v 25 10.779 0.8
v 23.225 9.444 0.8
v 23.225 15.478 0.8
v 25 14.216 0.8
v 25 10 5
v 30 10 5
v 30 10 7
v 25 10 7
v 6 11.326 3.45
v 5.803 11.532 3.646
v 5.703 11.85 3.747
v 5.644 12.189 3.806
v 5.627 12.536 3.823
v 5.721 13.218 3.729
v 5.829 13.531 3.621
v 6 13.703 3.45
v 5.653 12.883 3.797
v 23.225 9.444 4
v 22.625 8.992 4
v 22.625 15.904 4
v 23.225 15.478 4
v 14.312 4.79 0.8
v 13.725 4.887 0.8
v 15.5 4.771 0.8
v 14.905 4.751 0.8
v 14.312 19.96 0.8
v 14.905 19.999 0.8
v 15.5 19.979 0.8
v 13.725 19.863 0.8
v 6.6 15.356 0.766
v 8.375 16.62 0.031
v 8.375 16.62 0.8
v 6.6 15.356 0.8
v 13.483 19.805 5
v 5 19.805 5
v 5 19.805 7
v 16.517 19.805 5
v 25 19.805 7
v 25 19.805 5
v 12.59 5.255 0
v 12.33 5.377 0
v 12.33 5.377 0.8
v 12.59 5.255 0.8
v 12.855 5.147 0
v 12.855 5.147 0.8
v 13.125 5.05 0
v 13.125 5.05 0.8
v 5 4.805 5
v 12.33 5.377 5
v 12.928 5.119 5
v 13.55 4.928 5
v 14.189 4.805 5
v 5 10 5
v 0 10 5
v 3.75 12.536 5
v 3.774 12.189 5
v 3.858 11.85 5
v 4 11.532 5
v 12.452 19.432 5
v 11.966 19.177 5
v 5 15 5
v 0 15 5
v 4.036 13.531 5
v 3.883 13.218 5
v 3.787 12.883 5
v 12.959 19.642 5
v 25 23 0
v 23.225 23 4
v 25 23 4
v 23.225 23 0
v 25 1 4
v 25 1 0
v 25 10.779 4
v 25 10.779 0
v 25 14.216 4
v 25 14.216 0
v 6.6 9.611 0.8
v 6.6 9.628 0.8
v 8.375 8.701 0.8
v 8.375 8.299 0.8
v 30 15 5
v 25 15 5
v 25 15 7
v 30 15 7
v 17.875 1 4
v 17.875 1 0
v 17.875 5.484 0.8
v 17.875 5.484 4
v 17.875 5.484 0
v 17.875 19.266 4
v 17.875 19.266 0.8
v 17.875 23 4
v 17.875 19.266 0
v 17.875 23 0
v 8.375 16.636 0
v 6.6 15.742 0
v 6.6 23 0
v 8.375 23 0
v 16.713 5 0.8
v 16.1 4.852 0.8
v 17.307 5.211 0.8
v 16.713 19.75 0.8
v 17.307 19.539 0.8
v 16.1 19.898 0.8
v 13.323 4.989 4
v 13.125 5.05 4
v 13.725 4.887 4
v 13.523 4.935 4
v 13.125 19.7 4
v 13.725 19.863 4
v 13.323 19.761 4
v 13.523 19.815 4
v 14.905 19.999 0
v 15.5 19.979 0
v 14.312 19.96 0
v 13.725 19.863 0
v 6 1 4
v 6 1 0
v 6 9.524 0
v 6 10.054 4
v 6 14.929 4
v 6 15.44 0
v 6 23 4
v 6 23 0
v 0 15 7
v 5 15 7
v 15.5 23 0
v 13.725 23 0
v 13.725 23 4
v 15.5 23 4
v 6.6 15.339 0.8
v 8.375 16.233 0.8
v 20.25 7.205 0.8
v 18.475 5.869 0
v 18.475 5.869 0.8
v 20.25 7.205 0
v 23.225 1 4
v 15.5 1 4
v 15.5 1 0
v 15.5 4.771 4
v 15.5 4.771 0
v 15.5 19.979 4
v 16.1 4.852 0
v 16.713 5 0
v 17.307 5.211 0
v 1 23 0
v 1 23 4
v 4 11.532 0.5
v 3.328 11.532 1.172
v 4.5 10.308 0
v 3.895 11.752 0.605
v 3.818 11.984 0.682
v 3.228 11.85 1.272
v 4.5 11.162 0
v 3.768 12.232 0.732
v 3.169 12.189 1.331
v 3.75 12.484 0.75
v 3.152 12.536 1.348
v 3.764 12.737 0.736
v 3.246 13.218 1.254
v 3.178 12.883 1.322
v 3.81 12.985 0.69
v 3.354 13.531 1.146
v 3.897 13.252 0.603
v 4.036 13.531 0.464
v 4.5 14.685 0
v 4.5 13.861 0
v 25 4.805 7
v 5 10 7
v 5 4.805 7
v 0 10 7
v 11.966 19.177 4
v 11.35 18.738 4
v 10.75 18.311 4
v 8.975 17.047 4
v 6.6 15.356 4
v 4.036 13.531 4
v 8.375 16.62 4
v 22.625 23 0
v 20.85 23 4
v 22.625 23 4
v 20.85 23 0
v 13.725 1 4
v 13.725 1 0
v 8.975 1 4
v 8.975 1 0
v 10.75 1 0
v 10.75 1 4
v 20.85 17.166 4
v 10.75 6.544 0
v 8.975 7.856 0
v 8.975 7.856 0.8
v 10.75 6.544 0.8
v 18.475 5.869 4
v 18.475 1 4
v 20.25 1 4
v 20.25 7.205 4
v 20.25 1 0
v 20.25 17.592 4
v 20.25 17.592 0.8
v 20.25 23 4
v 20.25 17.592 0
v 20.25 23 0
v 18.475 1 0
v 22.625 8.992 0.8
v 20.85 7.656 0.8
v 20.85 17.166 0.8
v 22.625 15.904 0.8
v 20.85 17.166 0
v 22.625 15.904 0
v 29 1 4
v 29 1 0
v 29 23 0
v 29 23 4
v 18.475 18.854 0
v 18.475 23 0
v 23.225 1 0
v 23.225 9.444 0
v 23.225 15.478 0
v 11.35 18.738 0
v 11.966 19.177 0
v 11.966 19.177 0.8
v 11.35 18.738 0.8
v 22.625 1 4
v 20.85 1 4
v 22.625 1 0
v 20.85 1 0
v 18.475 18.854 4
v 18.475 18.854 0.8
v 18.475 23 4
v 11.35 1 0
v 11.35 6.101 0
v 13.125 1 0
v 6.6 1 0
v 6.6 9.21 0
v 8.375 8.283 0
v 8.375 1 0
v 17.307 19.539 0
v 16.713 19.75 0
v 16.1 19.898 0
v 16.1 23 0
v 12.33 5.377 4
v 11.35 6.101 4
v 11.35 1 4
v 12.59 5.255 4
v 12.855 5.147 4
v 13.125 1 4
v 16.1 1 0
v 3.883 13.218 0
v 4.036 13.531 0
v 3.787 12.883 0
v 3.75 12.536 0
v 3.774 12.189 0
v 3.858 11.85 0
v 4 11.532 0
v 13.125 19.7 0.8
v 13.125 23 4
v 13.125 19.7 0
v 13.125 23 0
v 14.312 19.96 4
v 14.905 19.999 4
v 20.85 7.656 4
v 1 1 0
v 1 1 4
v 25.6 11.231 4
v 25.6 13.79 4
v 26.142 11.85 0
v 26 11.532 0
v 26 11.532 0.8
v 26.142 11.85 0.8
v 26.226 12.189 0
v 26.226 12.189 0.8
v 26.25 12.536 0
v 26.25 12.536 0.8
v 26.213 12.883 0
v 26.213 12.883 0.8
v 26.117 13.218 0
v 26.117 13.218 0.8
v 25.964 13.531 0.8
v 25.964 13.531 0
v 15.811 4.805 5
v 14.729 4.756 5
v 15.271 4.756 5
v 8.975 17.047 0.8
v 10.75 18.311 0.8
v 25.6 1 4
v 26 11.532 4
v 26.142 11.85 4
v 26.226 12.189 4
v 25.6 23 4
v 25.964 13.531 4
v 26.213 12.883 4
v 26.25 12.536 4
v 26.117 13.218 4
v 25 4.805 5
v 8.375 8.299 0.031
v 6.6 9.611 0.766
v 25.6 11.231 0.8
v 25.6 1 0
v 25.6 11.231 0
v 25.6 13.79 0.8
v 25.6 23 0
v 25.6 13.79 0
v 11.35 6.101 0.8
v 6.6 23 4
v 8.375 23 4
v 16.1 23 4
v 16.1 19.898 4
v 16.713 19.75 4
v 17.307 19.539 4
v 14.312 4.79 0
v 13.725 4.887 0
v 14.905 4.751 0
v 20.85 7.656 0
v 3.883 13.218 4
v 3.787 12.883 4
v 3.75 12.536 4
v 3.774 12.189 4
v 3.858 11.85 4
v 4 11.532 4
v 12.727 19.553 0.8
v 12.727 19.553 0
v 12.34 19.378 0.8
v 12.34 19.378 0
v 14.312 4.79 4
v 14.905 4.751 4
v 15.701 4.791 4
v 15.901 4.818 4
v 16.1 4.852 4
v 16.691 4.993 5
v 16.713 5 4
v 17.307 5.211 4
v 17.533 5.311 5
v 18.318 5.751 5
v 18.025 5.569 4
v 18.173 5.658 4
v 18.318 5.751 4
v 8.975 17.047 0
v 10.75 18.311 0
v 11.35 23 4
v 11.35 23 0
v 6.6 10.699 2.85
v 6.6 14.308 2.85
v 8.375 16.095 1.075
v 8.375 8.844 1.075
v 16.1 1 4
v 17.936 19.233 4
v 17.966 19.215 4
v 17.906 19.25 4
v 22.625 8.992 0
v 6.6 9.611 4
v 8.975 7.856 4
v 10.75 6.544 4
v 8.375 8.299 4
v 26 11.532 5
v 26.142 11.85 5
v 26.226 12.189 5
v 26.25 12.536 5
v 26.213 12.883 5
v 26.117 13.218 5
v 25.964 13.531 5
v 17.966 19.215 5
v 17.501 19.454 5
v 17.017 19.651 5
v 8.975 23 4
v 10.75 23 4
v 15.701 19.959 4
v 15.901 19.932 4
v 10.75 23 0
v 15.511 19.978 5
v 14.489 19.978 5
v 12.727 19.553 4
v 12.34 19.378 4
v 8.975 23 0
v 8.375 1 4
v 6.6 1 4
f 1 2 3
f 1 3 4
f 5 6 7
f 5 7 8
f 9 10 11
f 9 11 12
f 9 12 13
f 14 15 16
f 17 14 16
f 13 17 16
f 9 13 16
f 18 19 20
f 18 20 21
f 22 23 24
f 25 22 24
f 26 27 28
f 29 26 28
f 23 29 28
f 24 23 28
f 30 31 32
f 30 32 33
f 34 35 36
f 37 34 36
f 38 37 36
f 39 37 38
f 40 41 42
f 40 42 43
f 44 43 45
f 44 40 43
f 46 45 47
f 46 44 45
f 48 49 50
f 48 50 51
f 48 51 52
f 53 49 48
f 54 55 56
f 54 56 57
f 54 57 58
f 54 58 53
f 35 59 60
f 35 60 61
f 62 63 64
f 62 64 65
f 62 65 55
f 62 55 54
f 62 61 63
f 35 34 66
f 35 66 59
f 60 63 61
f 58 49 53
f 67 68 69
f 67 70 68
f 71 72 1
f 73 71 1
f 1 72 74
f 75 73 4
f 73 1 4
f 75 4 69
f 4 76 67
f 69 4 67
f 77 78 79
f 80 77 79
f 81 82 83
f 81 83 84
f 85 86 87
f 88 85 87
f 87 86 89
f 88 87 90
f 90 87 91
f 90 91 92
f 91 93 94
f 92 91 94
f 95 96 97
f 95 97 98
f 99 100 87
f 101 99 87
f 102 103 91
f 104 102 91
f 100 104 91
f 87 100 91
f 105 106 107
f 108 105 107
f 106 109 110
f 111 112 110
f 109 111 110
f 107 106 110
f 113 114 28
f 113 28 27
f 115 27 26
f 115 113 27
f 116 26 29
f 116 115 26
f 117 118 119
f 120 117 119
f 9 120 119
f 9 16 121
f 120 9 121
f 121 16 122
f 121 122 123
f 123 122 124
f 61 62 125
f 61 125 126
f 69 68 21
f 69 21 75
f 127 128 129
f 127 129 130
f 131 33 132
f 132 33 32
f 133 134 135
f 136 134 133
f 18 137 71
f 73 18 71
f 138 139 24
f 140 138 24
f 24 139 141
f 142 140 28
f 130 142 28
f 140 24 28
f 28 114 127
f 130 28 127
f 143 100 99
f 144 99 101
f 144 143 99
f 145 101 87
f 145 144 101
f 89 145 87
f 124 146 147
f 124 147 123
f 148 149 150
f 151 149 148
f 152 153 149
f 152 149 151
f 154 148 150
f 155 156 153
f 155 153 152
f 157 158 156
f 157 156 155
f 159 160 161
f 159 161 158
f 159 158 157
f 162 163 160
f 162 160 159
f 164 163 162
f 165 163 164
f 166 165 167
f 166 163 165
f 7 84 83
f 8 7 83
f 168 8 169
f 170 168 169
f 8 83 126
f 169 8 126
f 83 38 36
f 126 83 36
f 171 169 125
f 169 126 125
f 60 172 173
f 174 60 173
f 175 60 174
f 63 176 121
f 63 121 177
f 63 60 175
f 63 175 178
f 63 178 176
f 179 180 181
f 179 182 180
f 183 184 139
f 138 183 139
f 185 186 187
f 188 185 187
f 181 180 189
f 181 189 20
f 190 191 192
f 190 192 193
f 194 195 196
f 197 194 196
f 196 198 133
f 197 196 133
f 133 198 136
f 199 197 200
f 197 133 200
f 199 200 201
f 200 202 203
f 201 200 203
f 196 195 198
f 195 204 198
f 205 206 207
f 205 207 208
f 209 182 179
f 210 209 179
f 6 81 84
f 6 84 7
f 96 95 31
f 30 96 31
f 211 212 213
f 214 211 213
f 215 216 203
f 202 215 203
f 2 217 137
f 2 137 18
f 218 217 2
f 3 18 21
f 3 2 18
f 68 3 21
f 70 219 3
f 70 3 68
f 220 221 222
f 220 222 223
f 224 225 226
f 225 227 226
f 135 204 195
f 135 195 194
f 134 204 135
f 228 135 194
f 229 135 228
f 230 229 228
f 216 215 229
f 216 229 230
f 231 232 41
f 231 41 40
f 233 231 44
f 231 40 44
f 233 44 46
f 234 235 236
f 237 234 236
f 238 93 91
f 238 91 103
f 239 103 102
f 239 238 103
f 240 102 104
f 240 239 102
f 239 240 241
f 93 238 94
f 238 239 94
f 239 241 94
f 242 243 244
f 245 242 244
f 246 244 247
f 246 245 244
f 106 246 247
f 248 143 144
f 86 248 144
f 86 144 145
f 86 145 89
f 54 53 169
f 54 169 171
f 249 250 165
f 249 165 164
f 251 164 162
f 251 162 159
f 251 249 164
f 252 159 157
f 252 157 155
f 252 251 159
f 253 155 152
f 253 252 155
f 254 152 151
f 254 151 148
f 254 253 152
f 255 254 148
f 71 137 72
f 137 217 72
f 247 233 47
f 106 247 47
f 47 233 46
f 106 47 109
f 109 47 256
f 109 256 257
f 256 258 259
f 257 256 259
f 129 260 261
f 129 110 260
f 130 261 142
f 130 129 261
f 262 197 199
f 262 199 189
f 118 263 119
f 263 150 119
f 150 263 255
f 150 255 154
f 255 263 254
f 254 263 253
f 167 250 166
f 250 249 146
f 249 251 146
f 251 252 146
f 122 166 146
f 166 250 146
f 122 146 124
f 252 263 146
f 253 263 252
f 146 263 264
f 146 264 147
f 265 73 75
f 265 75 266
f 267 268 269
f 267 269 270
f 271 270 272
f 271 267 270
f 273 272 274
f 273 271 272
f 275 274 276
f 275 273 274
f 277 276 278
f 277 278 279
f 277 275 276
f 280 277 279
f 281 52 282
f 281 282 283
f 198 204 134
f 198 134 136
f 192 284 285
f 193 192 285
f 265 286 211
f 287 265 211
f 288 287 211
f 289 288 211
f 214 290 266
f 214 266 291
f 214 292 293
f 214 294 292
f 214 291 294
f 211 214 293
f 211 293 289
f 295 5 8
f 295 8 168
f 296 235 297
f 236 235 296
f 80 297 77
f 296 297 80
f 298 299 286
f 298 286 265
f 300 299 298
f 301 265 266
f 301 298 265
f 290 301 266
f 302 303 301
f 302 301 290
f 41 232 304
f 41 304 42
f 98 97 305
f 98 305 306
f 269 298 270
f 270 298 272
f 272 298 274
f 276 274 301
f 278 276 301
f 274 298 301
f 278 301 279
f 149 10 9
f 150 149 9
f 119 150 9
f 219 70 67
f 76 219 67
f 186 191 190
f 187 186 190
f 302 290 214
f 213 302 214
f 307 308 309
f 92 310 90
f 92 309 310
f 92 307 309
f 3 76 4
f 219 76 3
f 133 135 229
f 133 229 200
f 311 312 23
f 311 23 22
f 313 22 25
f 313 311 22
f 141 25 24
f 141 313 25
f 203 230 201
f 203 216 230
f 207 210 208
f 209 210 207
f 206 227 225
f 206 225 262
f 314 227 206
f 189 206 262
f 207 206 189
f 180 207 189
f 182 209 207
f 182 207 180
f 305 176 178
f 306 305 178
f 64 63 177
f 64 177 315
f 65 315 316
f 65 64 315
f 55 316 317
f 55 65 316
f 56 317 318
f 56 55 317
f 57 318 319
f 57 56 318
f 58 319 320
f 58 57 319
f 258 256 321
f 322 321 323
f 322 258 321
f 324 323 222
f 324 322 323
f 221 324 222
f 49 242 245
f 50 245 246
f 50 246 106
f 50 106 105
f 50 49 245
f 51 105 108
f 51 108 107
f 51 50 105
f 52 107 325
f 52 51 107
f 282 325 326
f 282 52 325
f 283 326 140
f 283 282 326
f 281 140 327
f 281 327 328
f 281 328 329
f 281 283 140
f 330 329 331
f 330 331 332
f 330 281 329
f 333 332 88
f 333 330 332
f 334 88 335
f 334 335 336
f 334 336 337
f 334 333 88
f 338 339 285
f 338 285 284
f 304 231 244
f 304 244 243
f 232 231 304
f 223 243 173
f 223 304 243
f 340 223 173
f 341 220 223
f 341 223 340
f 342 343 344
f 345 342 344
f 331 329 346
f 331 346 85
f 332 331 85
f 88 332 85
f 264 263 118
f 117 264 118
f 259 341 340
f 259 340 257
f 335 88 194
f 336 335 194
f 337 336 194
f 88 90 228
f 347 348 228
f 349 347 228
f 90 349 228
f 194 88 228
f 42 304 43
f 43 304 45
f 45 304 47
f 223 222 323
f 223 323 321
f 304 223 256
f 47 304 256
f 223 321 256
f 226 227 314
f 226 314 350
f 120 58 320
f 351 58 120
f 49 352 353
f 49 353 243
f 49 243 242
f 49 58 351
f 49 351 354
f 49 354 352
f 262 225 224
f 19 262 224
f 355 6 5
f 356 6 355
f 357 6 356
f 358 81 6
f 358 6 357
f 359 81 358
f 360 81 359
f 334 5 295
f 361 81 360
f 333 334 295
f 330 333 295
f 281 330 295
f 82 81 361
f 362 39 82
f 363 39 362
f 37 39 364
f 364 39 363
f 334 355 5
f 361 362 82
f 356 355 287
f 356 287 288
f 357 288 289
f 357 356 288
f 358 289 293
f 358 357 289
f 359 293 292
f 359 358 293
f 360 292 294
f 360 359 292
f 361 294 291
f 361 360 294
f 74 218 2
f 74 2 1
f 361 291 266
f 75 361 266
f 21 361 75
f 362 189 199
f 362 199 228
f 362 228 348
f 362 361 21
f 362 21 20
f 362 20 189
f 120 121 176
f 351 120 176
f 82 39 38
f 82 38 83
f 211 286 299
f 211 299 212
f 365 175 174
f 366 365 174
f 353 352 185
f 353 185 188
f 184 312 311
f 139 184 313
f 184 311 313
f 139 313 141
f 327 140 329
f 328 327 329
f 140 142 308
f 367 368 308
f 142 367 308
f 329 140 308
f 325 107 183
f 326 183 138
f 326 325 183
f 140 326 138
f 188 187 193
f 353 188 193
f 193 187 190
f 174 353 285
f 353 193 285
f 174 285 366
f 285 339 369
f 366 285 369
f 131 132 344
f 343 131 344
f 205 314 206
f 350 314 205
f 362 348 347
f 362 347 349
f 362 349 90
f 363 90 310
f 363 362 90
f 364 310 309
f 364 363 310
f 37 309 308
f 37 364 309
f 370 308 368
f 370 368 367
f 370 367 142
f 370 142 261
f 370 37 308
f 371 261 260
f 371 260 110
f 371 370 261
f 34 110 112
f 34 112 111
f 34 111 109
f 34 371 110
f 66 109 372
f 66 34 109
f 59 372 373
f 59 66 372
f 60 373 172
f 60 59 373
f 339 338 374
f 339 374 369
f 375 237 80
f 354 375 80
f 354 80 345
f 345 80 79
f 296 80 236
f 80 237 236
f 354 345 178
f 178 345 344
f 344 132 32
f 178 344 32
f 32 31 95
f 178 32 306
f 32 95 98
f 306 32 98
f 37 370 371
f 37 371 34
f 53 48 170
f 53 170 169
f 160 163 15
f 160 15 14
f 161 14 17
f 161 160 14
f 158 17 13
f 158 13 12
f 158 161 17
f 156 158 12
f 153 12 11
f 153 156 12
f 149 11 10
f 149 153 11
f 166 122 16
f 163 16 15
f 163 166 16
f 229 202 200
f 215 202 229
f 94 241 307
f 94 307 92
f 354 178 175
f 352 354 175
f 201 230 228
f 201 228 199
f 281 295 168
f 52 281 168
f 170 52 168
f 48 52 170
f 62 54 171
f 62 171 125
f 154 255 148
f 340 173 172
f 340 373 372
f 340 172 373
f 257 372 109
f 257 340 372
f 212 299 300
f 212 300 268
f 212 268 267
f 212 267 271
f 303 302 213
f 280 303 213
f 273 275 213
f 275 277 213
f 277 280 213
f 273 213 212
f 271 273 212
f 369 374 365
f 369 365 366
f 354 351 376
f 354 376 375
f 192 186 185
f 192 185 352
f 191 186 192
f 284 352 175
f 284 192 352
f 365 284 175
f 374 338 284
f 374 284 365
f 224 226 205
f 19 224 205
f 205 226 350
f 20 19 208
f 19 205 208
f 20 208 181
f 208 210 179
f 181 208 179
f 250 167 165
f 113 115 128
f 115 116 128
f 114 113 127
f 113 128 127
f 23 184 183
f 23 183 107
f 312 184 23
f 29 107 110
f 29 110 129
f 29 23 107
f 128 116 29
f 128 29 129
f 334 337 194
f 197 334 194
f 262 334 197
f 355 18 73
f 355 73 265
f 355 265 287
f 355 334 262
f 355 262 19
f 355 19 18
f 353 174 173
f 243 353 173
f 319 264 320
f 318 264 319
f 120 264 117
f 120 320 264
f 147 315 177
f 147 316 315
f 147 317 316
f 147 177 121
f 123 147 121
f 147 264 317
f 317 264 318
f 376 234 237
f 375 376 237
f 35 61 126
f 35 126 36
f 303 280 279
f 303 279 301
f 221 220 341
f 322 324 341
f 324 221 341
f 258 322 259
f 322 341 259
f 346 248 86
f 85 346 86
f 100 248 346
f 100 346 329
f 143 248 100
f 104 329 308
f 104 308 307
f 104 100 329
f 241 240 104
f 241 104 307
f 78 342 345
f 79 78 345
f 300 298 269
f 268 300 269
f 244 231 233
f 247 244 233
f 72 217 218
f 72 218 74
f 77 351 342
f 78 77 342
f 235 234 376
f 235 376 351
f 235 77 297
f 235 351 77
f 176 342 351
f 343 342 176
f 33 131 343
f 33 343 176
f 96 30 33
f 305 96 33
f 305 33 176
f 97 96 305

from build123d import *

# Parameters (mm, degrees)
SKETCH_W             = 28
SKETCH_H             = 22
PAD002_DEPTH         = 5
POCKET001_DEPTH      = 0.8
SKETCH002_W          = 0.6
SKETCH002_H          = 23
POCKET_DEPTH         = 4
LINEARPATTERN_COUNT  = 9
LINEARPATTERN_PITCH  = 2.375
POCKET002_DEPTH      = 3.5
SKETCH006_W          = 28
SKETCH006_H          = 22
POCKET005_DEPTH      = 1
POCKET005_DEPTH_BACK = 1
PAD_DEPTH            = 2


with BuildPart() as part:
    # Sketch → Pad002 (new body)
    with BuildSketch(Plane.XY):
        with Locations((15, 12)):
            Rectangle(SKETCH_W, SKETCH_H)
    extrude(amount=PAD002_DEPTH)

    # Sketch001 → Pocket001 (cut)
    with BuildSketch(Plane.XY):
        with BuildLine():
            ThreePointArc((17.966363, 19.215428), (14.961232, 19.999875), (11.966488, 19.17666))
            Line((11.966488, 19.17666), (4.036475, 13.531422))
            ThreePointArc((4.036475, 13.531422), (3.750333, 12.536475), (4, 11.531754))
            Line((4, 11.531754), (12.33, 5.376817))
            ThreePointArc((12.33, 5.376817), (15.374304, 4.761687), (18.318313, 5.75112))
            Line((18.318313, 5.75112), (26, 11.531754))
            ThreePointArc((26, 11.531754), (26.249667, 12.536475), (25.963525, 13.531422))
            Line((25.963525, 13.531422), (17.966363, 19.215428))
        make_face()
    extrude(amount=POCKET001_DEPTH, mode=Mode.SUBTRACT)

    # Sketch002 → Pocket (cut)
    with BuildSketch(Plane.XY):
        with Locations((6.3, 11.5)):
            Rectangle(SKETCH002_W, SKETCH002_H)
    pocket = extrude(amount=POCKET_DEPTH, mode=Mode.SUBTRACT)

    # LinearPattern: Pocket ×9
    with Locations(*[(i * LINEARPATTERN_PITCH, 0, 0) for i in range(1, LINEARPATTERN_COUNT)]):
        add(pocket, mode=Mode.SUBTRACT)

    # Sketch003 → Pocket002 (cut)
    with BuildSketch(Plane(origin=(0.5, 0, 4), x_dir=(0.707107, 0, -0.707107), z_dir=(0.707107, 0, 0.707107))):
        with BuildLine():
            ThreePointArc((17.966363, 19.215428), (14.961232, 19.999875), (11.966488, 19.17666))
            Line((11.966488, 19.17666), (4.036475, 13.531422))
            ThreePointArc((4.036475, 13.531422), (3.750333, 12.536475), (4, 11.531754))
            Line((4, 11.531754), (12.33, 5.376817))
            ThreePointArc((12.33, 5.376817), (15.374304, 4.761687), (18.318313, 5.75112))
            Line((18.318313, 5.75112), (26, 11.531754))
            ThreePointArc((26, 11.531754), (26.249667, 12.536475), (25.963525, 13.531422))
            Line((25.963525, 13.531422), (17.966363, 19.215428))
        make_face()
    extrude(amount=POCKET002_DEPTH, mode=Mode.SUBTRACT)

    # Sketch006 → Pocket005 (cut, two sides)
    with BuildSketch(Plane.XY.offset(5)) as pocket005_sk:
        with Locations((15, 12)):
            Rectangle(SKETCH006_W, SKETCH006_H)
        with BuildLine():
            ThreePointArc((17.966363, 19.215428), (14.961232, 19.999875), (11.966488, 19.17666))
            Line((11.966488, 19.17666), (4.036475, 13.531422))
            ThreePointArc((4.036475, 13.531422), (3.750333, 12.536475), (4, 11.531754))
            Line((4, 11.531754), (12.33, 5.376817))
            ThreePointArc((12.33, 5.376817), (15.374304, 4.761687), (18.318313, 5.75112))
            Line((18.318313, 5.75112), (26, 11.531754))
            ThreePointArc((26, 11.531754), (26.249667, 12.536475), (25.963525, 13.531422))
            Line((25.963525, 13.531422), (17.966363, 19.215428))
        make_face(mode=Mode.SUBTRACT)
    extrude(amount=-POCKET005_DEPTH, mode=Mode.SUBTRACT)
    extrude(pocket005_sk.sketch, amount=POCKET005_DEPTH_BACK, mode=Mode.SUBTRACT)

    # Sketch004 → Pad (join)
    with BuildSketch(Plane.XY.offset(5)):
        Polygon((5, 19.805), (25, 19.805), (25, 15), (30, 15), (30, 10), (25, 10), (25, 4.805), (5, 4.805), (5, 10), (0, 10), (0, 15), (5, 15), align=None)
    extrude(amount=PAD_DEPTH)


solid = part.part
